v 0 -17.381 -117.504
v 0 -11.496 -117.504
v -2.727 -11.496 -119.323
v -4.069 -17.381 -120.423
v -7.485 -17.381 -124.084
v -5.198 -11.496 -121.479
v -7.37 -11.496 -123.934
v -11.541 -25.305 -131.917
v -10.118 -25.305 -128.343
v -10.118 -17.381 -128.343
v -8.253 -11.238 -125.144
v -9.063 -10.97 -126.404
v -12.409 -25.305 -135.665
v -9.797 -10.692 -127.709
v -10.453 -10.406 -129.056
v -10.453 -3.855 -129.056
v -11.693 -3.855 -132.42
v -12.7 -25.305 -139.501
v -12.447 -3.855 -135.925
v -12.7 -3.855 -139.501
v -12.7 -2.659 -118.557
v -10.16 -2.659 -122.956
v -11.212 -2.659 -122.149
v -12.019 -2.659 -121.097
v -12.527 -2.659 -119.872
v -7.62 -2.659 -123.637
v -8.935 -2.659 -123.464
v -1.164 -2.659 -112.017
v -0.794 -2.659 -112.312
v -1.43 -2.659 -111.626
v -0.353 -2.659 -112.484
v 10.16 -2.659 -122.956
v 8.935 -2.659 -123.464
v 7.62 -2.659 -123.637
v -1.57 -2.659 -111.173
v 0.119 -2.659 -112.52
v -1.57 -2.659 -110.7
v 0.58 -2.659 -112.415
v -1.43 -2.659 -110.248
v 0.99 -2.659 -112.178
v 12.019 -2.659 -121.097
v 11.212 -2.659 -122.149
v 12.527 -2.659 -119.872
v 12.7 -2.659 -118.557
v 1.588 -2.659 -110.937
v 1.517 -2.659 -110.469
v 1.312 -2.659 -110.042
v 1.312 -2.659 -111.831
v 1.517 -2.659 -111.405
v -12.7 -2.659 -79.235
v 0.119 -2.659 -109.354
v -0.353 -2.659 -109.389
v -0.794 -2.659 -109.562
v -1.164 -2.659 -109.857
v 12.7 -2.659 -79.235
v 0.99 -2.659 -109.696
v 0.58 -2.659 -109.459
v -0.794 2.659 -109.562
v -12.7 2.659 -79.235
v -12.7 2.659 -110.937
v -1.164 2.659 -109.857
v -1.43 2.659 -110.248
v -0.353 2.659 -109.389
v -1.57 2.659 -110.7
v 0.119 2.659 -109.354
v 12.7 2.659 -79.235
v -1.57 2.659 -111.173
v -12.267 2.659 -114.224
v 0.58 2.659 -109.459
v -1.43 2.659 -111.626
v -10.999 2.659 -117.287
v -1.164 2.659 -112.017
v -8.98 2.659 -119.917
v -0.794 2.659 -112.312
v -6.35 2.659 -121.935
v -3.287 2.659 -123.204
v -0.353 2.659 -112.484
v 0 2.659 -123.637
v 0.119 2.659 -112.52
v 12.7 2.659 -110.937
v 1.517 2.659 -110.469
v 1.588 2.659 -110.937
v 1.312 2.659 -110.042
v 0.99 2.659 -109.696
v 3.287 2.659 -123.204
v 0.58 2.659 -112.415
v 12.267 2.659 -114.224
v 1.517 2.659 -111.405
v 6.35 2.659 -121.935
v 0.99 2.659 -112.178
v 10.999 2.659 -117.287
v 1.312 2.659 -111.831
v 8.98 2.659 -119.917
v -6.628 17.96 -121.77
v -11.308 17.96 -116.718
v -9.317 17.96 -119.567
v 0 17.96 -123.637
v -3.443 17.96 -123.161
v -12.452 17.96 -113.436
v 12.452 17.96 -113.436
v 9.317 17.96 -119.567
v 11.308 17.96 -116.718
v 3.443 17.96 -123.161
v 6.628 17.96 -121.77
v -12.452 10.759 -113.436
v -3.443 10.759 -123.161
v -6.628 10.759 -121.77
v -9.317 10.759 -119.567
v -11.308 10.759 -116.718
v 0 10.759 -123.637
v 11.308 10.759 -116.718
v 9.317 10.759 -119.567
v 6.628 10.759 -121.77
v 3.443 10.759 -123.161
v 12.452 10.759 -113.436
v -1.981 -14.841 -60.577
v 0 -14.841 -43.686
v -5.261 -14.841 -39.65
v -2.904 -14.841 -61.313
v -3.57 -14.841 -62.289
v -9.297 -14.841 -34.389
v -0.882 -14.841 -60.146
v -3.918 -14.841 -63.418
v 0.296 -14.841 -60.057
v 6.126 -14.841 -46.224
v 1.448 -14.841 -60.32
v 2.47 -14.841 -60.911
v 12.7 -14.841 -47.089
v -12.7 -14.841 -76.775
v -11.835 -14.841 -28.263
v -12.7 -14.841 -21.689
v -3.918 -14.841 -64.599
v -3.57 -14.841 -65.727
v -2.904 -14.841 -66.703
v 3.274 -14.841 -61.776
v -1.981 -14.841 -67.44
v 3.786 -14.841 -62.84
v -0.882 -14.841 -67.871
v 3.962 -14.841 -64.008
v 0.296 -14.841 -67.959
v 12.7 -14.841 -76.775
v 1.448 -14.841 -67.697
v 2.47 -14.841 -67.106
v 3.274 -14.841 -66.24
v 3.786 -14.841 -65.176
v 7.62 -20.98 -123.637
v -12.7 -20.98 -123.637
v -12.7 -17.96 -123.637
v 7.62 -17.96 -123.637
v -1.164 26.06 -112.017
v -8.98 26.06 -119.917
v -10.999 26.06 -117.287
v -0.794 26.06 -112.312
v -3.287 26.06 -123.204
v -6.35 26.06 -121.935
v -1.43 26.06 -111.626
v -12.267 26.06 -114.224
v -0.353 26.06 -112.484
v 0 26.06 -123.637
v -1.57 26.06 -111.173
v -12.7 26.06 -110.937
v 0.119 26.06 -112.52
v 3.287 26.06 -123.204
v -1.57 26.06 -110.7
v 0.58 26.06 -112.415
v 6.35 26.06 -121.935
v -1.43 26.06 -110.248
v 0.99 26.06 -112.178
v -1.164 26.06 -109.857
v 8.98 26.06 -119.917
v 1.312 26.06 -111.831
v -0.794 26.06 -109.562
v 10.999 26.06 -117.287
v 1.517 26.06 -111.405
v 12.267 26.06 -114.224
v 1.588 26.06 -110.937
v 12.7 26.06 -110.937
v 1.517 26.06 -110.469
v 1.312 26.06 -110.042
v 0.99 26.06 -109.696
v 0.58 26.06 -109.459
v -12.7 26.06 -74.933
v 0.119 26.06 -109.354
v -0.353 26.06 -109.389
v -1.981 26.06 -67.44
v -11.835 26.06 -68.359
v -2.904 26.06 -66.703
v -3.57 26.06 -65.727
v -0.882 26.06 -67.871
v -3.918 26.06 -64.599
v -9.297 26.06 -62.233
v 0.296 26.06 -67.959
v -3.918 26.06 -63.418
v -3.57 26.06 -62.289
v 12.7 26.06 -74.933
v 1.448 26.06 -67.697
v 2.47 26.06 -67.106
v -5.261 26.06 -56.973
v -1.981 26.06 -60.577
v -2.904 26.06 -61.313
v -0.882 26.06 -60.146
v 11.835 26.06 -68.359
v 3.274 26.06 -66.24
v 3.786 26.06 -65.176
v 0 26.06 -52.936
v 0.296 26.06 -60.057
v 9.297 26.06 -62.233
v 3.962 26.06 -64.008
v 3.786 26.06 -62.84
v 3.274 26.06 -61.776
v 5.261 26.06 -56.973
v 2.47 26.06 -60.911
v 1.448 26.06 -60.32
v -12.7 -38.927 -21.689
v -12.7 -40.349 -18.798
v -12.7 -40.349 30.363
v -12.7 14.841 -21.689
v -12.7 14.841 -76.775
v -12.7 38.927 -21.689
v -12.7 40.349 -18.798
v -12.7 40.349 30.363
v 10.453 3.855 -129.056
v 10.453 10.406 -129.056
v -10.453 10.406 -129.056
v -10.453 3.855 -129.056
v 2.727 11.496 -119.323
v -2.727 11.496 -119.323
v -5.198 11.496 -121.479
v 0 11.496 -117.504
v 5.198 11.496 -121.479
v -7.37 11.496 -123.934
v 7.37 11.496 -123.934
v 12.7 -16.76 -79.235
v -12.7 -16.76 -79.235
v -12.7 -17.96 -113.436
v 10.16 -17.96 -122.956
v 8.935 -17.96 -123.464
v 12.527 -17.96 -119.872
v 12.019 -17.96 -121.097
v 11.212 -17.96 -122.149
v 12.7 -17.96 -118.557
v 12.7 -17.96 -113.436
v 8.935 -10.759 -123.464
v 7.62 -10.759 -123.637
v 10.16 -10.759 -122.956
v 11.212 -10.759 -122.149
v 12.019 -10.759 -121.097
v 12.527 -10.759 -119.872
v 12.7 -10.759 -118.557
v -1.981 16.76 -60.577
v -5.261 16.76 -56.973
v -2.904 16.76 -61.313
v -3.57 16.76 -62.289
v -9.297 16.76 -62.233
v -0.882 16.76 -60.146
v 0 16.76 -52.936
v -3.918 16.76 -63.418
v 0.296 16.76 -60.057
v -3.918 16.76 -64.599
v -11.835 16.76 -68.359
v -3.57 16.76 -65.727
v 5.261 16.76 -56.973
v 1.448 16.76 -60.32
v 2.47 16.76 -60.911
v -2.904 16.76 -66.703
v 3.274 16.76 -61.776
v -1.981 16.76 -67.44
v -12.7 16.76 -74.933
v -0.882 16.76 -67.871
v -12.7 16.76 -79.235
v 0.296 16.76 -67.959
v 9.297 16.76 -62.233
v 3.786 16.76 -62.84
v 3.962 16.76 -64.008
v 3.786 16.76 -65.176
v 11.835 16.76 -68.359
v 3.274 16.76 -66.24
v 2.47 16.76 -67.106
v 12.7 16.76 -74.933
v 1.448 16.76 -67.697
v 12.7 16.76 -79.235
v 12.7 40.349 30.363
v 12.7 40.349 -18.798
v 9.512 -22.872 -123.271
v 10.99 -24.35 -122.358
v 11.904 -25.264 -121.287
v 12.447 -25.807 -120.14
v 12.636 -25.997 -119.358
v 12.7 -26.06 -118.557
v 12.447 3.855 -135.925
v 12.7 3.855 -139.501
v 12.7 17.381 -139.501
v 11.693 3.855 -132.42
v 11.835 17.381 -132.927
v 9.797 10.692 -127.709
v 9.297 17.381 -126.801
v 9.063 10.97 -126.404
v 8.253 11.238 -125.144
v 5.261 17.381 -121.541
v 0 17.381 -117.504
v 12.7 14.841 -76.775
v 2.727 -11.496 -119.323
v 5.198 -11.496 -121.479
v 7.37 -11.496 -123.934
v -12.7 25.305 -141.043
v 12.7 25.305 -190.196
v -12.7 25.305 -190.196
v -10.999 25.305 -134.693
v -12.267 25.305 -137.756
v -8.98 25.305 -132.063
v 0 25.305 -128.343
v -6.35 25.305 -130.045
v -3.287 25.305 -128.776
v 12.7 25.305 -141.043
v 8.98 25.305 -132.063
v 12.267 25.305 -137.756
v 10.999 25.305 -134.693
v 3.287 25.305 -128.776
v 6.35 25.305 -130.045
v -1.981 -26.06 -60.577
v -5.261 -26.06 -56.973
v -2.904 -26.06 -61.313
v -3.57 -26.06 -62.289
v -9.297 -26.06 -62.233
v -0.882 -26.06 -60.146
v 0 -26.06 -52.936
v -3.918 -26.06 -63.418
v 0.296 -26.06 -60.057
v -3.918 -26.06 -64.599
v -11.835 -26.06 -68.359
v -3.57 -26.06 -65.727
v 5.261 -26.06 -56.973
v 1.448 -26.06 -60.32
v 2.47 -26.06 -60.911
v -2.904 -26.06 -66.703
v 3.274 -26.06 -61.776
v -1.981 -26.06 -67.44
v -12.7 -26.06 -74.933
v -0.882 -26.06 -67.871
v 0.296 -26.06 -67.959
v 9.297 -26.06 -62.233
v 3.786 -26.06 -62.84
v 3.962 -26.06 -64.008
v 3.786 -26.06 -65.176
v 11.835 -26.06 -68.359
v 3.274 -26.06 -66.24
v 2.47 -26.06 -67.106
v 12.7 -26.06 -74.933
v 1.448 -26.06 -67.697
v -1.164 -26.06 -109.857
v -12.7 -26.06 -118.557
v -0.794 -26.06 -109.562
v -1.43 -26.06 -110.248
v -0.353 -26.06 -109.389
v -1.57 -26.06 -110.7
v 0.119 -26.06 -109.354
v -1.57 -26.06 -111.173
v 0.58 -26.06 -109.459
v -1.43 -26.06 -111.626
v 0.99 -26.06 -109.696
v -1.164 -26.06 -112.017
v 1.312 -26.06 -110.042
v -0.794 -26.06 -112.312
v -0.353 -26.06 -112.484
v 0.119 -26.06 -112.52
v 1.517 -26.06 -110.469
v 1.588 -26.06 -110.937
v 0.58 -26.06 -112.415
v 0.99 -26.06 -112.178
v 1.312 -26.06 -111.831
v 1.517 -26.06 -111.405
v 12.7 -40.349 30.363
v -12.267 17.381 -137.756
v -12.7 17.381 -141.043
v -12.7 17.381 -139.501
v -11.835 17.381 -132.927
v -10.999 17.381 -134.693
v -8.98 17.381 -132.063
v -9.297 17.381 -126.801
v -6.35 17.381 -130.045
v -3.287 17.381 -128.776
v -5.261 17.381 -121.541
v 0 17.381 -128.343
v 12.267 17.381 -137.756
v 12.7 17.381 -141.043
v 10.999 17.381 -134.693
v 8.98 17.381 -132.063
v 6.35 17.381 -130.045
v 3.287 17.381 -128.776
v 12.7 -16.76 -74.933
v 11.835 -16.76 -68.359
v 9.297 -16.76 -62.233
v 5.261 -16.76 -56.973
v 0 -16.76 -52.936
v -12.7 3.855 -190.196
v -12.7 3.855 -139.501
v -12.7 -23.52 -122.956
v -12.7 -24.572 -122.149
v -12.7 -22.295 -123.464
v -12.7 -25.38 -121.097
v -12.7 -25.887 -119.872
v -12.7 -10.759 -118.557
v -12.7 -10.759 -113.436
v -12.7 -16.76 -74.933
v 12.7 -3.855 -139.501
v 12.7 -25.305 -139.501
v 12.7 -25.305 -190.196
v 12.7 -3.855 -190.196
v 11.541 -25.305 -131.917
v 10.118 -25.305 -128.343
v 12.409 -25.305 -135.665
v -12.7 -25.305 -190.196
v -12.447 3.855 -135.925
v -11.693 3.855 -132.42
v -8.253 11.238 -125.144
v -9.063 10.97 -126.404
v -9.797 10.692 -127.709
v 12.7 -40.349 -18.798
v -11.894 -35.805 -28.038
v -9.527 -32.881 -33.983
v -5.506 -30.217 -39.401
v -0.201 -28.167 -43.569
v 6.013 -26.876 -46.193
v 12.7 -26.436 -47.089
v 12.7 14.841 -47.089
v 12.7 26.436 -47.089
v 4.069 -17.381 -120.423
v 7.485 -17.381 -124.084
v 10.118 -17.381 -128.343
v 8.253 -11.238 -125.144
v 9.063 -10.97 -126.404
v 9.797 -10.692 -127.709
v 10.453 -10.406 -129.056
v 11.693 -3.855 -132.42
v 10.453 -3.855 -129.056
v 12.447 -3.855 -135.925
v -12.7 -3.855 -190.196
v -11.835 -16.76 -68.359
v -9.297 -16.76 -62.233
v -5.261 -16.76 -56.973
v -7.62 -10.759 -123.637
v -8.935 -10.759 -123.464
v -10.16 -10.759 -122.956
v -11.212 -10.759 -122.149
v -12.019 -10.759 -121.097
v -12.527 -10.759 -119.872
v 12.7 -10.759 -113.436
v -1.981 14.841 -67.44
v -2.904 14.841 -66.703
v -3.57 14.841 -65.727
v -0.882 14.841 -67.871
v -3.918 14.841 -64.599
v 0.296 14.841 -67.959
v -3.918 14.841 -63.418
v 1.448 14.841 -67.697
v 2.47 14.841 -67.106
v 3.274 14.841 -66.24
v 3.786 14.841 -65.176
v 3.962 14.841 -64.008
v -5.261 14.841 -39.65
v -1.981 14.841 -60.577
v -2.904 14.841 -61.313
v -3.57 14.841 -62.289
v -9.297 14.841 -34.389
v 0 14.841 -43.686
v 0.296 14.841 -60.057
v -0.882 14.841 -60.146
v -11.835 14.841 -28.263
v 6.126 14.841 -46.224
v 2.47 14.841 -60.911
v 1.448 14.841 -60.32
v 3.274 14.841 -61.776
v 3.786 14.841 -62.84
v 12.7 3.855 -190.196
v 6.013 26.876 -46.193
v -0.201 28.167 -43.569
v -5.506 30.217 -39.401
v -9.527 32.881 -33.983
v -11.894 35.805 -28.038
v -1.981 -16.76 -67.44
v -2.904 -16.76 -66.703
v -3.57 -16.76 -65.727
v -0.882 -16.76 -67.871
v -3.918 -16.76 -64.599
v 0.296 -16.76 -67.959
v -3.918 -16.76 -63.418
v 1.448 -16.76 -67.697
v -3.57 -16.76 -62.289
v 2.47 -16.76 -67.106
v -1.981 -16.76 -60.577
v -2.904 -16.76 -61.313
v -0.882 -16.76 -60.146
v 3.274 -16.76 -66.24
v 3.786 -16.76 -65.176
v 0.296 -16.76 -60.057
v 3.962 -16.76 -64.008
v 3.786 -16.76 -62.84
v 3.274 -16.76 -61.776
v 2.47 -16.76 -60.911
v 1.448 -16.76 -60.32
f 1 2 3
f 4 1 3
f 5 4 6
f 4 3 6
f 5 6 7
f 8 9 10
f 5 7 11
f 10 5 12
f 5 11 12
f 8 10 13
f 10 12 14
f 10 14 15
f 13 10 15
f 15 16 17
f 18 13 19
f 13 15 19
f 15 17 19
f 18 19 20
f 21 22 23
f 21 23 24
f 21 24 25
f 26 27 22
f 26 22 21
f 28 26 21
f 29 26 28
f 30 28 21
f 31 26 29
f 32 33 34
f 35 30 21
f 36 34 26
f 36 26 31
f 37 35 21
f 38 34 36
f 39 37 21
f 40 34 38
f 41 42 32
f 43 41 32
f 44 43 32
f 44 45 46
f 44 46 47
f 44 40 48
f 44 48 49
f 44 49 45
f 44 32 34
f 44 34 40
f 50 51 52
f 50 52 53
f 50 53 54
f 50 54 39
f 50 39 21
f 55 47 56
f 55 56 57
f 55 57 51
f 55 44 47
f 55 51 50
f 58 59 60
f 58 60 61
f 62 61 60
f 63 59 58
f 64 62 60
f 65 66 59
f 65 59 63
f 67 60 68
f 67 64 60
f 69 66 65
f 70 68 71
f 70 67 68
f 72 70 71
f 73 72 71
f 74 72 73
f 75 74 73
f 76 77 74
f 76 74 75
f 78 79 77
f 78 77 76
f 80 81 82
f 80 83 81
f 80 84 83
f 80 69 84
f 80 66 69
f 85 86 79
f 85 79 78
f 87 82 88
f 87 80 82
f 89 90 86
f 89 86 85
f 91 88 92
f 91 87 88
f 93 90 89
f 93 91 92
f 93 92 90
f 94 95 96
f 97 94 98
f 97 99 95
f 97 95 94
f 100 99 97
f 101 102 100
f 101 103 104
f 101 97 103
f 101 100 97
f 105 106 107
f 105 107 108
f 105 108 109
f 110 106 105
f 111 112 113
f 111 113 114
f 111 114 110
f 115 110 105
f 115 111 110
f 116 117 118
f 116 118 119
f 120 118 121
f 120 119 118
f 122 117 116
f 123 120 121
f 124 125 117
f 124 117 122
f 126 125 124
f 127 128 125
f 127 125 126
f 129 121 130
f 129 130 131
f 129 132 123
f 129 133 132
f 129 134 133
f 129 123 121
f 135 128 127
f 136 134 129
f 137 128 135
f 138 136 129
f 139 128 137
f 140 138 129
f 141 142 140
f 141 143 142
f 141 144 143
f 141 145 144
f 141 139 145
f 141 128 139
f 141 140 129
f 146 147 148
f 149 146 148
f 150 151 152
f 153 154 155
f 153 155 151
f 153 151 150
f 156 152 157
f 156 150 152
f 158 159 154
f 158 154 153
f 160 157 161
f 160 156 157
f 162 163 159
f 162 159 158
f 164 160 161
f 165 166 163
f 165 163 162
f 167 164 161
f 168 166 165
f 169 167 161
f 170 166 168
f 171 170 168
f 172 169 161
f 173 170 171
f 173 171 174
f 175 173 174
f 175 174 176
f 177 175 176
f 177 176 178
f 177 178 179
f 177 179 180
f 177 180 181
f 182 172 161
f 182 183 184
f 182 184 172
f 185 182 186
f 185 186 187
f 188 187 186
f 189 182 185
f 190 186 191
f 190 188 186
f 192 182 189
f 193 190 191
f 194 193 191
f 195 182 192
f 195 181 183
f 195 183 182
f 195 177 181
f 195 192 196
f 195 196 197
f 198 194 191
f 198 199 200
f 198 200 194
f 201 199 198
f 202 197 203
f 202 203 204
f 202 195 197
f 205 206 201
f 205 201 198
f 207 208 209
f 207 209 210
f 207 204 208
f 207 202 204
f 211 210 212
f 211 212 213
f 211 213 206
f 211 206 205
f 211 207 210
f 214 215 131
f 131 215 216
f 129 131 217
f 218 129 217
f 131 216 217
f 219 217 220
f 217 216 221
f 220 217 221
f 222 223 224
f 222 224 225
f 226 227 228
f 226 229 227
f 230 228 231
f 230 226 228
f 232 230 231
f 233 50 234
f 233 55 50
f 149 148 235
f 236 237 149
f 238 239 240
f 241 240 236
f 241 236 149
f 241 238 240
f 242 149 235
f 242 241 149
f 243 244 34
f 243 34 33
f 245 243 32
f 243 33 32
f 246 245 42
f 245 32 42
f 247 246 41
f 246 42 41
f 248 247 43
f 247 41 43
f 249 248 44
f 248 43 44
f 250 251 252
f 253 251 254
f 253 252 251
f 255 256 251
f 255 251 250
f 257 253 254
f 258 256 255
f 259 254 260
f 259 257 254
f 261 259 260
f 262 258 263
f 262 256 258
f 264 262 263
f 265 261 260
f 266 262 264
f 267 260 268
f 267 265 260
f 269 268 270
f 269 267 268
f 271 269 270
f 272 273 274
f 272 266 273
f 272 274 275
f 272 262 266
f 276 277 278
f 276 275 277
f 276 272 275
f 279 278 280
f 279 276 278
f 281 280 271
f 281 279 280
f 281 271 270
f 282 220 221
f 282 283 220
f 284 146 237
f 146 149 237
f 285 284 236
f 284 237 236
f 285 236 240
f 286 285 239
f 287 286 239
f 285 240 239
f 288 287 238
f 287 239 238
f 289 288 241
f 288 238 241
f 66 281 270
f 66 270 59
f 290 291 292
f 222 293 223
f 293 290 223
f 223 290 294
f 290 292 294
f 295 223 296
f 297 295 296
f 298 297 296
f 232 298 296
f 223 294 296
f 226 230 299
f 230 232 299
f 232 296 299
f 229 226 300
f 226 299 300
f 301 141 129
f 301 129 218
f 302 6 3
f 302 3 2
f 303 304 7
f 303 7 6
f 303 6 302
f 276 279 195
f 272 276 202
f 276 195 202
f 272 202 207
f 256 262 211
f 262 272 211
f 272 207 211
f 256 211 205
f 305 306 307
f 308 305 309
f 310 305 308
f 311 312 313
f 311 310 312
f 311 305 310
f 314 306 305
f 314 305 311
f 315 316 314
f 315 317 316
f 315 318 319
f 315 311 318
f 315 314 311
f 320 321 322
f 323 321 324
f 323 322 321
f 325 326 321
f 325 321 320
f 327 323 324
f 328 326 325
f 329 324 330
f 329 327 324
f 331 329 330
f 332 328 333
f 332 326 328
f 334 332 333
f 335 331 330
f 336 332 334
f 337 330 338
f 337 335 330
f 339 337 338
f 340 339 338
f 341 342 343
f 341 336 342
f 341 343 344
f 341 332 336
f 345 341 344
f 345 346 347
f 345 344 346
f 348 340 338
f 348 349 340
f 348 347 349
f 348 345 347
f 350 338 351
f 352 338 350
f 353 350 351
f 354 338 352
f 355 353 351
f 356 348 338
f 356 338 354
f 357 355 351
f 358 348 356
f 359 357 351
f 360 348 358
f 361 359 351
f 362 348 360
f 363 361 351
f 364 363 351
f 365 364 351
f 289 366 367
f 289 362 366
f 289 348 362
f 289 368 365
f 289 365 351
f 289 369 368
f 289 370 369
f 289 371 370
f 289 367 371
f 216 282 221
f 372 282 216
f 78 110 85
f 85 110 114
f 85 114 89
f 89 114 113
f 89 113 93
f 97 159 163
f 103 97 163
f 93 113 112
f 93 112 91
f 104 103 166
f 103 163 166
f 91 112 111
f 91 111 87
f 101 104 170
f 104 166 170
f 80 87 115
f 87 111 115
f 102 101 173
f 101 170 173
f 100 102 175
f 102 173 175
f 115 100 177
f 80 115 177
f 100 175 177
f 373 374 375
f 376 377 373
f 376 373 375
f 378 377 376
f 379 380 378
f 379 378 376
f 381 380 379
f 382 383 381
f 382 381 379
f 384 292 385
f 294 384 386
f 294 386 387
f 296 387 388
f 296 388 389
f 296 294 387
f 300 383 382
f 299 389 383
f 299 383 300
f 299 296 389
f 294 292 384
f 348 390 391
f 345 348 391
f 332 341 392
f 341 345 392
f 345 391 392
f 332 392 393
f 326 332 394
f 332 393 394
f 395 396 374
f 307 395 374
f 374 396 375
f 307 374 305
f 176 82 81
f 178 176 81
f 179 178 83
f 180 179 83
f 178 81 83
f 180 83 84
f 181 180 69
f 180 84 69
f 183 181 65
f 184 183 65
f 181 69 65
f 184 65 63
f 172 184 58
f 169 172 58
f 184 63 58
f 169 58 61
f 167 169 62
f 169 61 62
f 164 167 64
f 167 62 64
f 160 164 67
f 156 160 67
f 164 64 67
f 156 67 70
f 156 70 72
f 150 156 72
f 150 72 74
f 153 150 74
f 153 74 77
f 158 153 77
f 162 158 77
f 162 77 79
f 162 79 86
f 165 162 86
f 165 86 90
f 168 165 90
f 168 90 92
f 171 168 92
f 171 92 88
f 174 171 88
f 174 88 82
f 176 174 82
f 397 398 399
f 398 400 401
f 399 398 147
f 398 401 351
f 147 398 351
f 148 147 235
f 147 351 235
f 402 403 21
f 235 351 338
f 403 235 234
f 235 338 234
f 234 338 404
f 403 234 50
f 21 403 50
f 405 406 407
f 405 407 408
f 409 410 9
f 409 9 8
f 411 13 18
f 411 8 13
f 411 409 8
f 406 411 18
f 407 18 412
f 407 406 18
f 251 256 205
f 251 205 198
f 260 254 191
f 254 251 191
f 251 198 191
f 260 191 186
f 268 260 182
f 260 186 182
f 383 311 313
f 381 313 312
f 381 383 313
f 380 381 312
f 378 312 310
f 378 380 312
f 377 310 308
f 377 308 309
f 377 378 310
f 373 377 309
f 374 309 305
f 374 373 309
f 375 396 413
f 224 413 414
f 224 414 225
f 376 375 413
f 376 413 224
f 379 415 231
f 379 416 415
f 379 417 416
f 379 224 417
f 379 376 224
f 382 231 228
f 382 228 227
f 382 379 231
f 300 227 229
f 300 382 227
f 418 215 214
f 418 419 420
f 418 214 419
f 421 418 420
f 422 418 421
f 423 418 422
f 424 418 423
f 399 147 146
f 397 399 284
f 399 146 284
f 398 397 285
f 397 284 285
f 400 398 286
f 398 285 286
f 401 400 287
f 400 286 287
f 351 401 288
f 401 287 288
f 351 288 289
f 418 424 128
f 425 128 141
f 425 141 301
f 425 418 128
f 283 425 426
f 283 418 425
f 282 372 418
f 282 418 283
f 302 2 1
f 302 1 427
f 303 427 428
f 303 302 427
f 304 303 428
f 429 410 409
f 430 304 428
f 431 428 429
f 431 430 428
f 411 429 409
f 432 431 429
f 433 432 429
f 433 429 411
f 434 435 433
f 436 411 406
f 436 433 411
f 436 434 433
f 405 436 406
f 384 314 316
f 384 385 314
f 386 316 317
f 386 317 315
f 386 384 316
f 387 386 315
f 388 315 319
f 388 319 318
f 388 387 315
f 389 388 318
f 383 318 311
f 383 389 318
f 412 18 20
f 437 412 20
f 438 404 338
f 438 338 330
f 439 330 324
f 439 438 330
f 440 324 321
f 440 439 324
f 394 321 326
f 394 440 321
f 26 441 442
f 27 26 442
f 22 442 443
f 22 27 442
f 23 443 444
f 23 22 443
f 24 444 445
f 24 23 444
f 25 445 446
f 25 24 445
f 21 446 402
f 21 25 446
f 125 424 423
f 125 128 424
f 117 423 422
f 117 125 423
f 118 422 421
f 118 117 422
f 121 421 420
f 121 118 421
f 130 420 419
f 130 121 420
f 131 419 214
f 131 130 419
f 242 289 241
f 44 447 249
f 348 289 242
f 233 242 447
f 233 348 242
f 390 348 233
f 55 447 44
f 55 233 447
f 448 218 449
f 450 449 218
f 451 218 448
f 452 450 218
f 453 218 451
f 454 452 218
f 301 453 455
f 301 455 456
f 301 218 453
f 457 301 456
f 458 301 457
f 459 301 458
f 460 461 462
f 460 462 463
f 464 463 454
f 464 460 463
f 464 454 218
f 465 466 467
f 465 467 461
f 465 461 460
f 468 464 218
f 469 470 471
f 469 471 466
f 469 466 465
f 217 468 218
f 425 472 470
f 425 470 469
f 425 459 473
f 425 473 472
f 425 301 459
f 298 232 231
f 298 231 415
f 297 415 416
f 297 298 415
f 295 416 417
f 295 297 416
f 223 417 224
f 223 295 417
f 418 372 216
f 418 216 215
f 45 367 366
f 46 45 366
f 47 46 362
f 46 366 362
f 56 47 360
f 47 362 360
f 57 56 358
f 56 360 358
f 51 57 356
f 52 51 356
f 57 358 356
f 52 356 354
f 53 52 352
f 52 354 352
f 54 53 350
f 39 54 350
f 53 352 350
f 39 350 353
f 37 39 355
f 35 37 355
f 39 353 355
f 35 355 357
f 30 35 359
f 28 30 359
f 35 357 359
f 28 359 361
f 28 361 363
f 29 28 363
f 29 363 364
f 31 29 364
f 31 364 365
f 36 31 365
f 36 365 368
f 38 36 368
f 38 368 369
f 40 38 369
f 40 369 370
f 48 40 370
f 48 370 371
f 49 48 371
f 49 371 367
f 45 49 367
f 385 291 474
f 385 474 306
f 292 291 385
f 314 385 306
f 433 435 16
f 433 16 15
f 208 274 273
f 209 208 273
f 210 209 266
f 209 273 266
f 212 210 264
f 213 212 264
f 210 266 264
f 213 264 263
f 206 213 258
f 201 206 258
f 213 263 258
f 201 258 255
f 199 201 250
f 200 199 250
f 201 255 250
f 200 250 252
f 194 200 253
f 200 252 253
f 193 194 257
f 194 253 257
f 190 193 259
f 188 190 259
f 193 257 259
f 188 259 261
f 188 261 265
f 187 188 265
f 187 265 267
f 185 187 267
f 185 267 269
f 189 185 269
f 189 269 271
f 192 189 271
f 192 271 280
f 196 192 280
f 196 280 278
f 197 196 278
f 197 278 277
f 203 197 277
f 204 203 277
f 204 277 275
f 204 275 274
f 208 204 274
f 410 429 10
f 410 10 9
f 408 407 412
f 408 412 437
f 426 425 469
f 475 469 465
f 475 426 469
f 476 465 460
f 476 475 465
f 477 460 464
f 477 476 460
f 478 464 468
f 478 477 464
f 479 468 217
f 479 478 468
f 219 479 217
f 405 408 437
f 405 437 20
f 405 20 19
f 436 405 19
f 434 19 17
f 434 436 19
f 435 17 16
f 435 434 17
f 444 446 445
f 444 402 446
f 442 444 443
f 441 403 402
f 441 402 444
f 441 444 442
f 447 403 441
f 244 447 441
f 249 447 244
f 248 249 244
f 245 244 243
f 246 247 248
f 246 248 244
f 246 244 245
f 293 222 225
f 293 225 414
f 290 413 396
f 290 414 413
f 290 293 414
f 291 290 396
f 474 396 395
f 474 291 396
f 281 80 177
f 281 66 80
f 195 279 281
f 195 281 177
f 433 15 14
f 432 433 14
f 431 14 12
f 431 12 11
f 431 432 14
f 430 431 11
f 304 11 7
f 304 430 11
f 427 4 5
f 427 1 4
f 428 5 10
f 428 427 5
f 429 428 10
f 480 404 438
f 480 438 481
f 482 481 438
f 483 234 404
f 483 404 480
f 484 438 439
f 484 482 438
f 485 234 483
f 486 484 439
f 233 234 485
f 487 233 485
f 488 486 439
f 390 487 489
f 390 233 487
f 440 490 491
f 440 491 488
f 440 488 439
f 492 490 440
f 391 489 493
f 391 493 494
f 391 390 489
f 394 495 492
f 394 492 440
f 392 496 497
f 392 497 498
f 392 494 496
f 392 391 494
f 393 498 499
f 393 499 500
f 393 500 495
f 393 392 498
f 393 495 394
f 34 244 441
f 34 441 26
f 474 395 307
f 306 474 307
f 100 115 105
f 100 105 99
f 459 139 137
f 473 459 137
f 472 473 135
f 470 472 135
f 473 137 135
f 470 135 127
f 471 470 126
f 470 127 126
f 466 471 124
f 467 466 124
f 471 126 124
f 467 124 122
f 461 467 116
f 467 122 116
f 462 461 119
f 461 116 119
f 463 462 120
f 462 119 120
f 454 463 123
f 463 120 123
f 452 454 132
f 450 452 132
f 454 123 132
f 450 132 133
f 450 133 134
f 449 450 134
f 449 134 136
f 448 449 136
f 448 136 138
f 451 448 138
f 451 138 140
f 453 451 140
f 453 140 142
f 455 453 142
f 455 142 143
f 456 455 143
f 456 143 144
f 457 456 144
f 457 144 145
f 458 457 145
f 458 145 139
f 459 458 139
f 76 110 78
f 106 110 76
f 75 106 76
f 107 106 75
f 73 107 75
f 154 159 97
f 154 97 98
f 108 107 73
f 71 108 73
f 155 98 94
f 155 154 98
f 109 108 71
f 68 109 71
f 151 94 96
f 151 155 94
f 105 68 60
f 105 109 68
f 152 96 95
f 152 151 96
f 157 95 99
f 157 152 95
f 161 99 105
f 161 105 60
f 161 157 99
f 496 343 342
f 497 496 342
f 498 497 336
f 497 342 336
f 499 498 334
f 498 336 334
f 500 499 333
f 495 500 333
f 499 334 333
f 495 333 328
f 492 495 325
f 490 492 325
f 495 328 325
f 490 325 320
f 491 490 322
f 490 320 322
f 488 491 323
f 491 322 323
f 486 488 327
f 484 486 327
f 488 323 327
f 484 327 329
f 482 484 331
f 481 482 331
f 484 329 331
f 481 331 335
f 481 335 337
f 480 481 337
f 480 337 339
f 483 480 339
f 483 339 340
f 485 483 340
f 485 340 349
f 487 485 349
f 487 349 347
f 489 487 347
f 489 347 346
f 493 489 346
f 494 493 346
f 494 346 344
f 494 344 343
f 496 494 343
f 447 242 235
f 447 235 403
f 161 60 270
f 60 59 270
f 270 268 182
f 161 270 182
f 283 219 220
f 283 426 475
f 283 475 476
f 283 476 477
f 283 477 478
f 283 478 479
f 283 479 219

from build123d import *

# Parameters (mm, degrees)
F6_DEPTH       = 12.7
F7_DEPTH       = 12.7
F8_DEPTH       = 12.7
F9_F1_R        = 12.7
F9_F2_R        = 12.6999
F9_2_T1_DEPTH  = 71.6003941596
F9_2_T3_DEPTH  = 71.6003969535
F10_R          = 5.08
F11_T1_DEPTH   = 132.8857165277
F11_2_T1_DEPTH = 132.8857165277
F12_T1_DEPTH   = 136.3004535884
F12_2_T1_DEPTH = 136.3004535884
F12_3_F1_R     = 25.3999
F12_3_F2_R     = 25.3999
F13_R          = 3.1967586716
F14_DEPTH      = 40.3502301702
F15_R          = 3.9621319953
F16_DEPTH      = 66.4104053209
F19_R          = 1.5875
F20_DEPTH      = 66.4104053209


# Not quite as in the source:
# - a fillet or chamfer that OpenCascade refuses, or shapes differently, is made with other operations: its cross-section is extruded or revolved along the edge and cut away or added
# - a fillet or chamfer is up to 0.001 mm smaller than in the source, because OpenCascade refuses the exact size
# - a feature of the source that left no trace in its solid (it failed there, or was rolled back) is left out
# - the program builds the solid bodies; features that only make, move or delete a surface that nothing else refers to are left out


with BuildPart() as f6:
    # F5 (on Right) → F6 (new body, symmetric)
    with BuildSketch(Plane.YZ):
        Polygon((17.381310463, -124.0725144744), (17.381310463, -114.1014173627), (11.4955939353, -114.1014173627), (11.4955939353, -123.9340305328), (10.4060629383, -129.0555149317), (3.8553033955, -129.0555149317), (3.8553033955, -190.1959329844), (8.2224793732, -190.1959329844), (20.4505622387, -190.1959329844), (25.3053139895, -190.1959329844), (25.3053139895, -128.343090415), (17.381310463, -128.343090415), align=None)
    extrude(amount=F6_DEPTH, both=True)

    # F9: fillet of radius 12.7 on 2 edges, made by hand

    # F9_f1
    f9_f1_edges = [f6.edges().sort_by_distance(p)[0] for p in [
        (-12.7, 21.3433122262, -128.343090415),
    ]]
    fillet(f9_f1_edges, radius=F9_F1_R)

    # F9_f2 (radius 12.7 in the source; OpenCascade refuses exactly that, so slightly less here)
    f9_f2_edges = [f6.edges().sort_by_distance(p)[0] for p in [
        (12.7, 21.3433122262, -128.343090415),
    ]]
    fillet(f9_f2_edges, radius=F9_F2_R)

    # F11: fillet of radius 25.4 on 2 edges, made by hand

    # F11_s2 → F11_t1 (cut)
    with BuildSketch(Plane.XZ.offset(-80.881310463)):
        with BuildLine():
            ThreePointArc((12.7, -139.5014173627), (5.2605122421, -121.5409051206), (-12.7, -114.1014173627))
            Line((-12.7, -114.1014173627), (12.7, -114.1014173627))
            Line((12.7, -114.1014173627), (12.7, -139.5014173627))
        make_face()
        with BuildLine():
            ThreePointArc((-12.7, -139.5014173627), (-5.2605122421, -121.5409051206), (12.7, -114.1014173627))
            Line((12.7, -114.1014173627), (-12.7, -114.1014173627))
            Line((-12.7, -114.1014173627), (-12.7, -139.5014173627))
        make_face()
    extrude(amount=F11_T1_DEPTH, mode=Mode.SUBTRACT)


with BuildPart() as f6b:
    # F5 (on Right) → F6, piece 2 (new body, symmetric)
    with BuildSketch(Plane.YZ):
        Polygon((-17.381310463, -128.343090415), (-25.3053139895, -128.343090415), (-25.3053139895, -190.1959329844), (-20.4505622387, -190.1959329844), (-8.2224793732, -190.1959329844), (-3.8553033955, -190.1959329844), (-3.8553033955, -129.0555149317), (-10.4060629383, -129.0555149317), (-11.4955939353, -123.9340305328), (-11.4955939353, -114.1014173627), (-17.381310463, -114.1014173627), (-17.381310463, -124.0725144744), align=None)
    extrude(amount=F6_DEPTH, both=True)

    # F11#2: fillet of radius 25.4 on 2 edges, made by hand

    # F11_2_s2 → F11_2_t1 (cut)
    with BuildSketch(Plane.XZ.offset(-52.0044060647)):
        with BuildLine():
            ThreePointArc((-12.7, -114.1014173627), (5.2605122421, -121.5409051206), (12.7, -139.5014173627))
            Line((12.7, -139.5014173627), (12.7, -114.1014173627))
            Line((12.7, -114.1014173627), (-12.7, -114.1014173627))
        make_face()
        with BuildLine():
            ThreePointArc((12.7, -114.1014173627), (-5.2605122421, -121.5409051206), (-12.7, -139.5014173627))
            Line((-12.7, -139.5014173627), (-12.7, -114.1014173627))
            Line((-12.7, -114.1014173627), (12.7, -114.1014173627))
        make_face()
    extrude(amount=F11_2_T1_DEPTH, mode=Mode.SUBTRACT)


with BuildPart() as f7:
    # F4 (on Right) → F7 (new body, symmetric)
    with BuildSketch(Plane.YZ):
        Polygon((26.0601751506, -123.6367598176), (26.0601751506, -49.5331436396), (16.7597215623, -49.5331436396), (16.7597215623, -79.2345926166), (2.65903119, -79.2345926166), (2.65903119, -123.6367598176), (10.7594281435, -123.6367598176), (10.7594281435, -113.4362667799), (17.9597809911, -113.4362667799), (17.9597809911, -123.6367598176), align=None)
    extrude(amount=F7_DEPTH, both=True)

    # F9#2: fillet of radius 12.7 on 4 edges, made by hand

    # F9_2_s2 → F9_2_t1 (cut)
    with BuildSketch(Plane.XZ.offset(-57.8101751506)):
        with BuildLine():
            ThreePointArc((0, -123.6367598176), (8.9802561211, -119.9170159387), (12.7, -110.9367598176))
            Line((12.7, -110.9367598176), (12.7, -123.6367598176))
            Line((12.7, -123.6367598176), (0, -123.6367598176))
        make_face()
        with BuildLine():
            ThreePointArc((0, -123.6367598176), (-8.9802561211, -119.9170159387), (-12.7, -110.9367598176))
            Line((-12.7, -110.9367598176), (-12.7, -123.6367598176))
            Line((-12.7, -123.6367598176), (0, -123.6367598176))
        make_face()
    extrude(amount=F9_2_T1_DEPTH, mode=Mode.SUBTRACT)

    # F9_2_s4 → F9_2_t3 (cut)
    with BuildSketch(Plane.XZ.offset(-42.5094281435)):
        with BuildLine():
            ThreePointArc((0, -123.6367598176), (-8.9802561211, -119.9170159387), (-12.7, -110.9367598176))
            Line((-12.7, -110.9367598176), (-12.7, -123.6367598176))
            Line((-12.7, -123.6367598176), (0, -123.6367598176))
        make_face()
        with BuildLine():
            ThreePointArc((0, -123.6367598176), (8.9802561211, -119.9170159387), (12.7, -110.9367598176))
            Line((12.7, -110.9367598176), (12.7, -123.6367598176))
            Line((12.7, -123.6367598176), (0, -123.6367598176))
        make_face()
    extrude(amount=F9_2_T3_DEPTH, mode=Mode.SUBTRACT)

    # F12: fillet of radius 25.4 on 2 edges, made by hand

    # F12_s2 → F12_t1 (cut)
    with BuildSketch(Plane.XZ.offset(-89.5601751506)):
        with BuildLine():
            ThreePointArc((12.7, -49.5331436396), (-5.2605122421, -56.9726313974), (-12.7, -74.9331436396))
            Line((-12.7, -74.9331436396), (-12.7, -49.5331436396))
            Line((-12.7, -49.5331436396), (12.7, -49.5331436396))
        make_face()
        with BuildLine():
            ThreePointArc((12.7, -74.9331436396), (5.2605122421, -56.9726313974), (-12.7, -49.5331436396))
            Line((-12.7, -49.5331436396), (12.7, -49.5331436396))
            Line((12.7, -49.5331436396), (12.7, -74.9331436396))
        make_face()
    extrude(amount=F12_T1_DEPTH, mode=Mode.SUBTRACT)


with BuildPart() as f7b:
    # F4 (on Right) → F7, piece 2 (new body, symmetric)
    with BuildSketch(Plane.YZ):
        Polygon((-16.7597215623, -49.5331436396), (-26.0601751506, -49.5331436396), (-26.0601751506, -123.6367598176), (-17.9597809911, -123.6367598176), (-17.9597809911, -113.4362667799), (-10.7594281435, -113.4362667799), (-10.7594281435, -123.6367598176), (-2.65903119, -123.6367598176), (-2.65903119, -79.2345926166), (-16.7597215623, -79.2345926166), align=None)
    extrude(amount=F7_DEPTH, both=True)

    # F10
    f10_edges = [f7b.edges().sort_by_distance(p)[0] for p in [
        (12.7, -22.009978, -123.63676),
        (0, -26.060175, -123.63676),
        (-12.7, -6.70923, -123.63676),
        (12.7, -6.70923, -123.63676),
    ]]
    fillet(f10_edges, radius=F10_R)

    # F12#2: fillet of radius 25.4 on 2 edges, made by hand

    # F12_2_s2 → F12_2_t1 (cut)
    with BuildSketch(Plane.XZ.offset(-46.7402784377)):
        with BuildLine():
            ThreePointArc((-12.7, -74.9331436396), (-5.2605122421, -56.9726313974), (12.7, -49.5331436396))
            Line((12.7, -49.5331436396), (-12.7, -49.5331436396))
            Line((-12.7, -49.5331436396), (-12.7, -74.9331436396))
        make_face()
        with BuildLine():
            ThreePointArc((12.7, -74.9331436396), (5.2605122421, -56.9726313974), (-12.7, -49.5331436396))
            Line((-12.7, -49.5331436396), (12.7, -49.5331436396))
            Line((12.7, -49.5331436396), (12.7, -74.9331436396))
        make_face()
    extrude(amount=F12_2_T1_DEPTH, mode=Mode.SUBTRACT)


with BuildPart() as f8:
    # F3 (on Right) → F8 (new body, symmetric)
    with BuildSketch(Plane.YZ):
        Polygon((40.3492301702, 30.3626544774), (-40.3492301702, 30.3626544774), (-40.3492301702, 0), (-40.3492301702, -18.7984760851), (-26.4357030392, -47.0893159509), (-14.841097407, -47.0893159509), (-14.841097407, -76.7751282773), (14.841097407, -76.7751282773), (14.841097407, -47.0893159509), (26.4357030392, -47.0893159509), (40.3492301702, -18.7984760851), (40.3492301702, 0), align=None)
    extrude(amount=F8_DEPTH, both=True)

    # F12#3: fillet of radius 25.4 on 2 edges, made by hand

    # F12_3_f1 (radius 25.4 in the source; OpenCascade refuses exactly that, so slightly less here)
    f12_3_f1_edges = [f8.edges().sort_by_distance(p)[0] for p in [
        (-12.7, 20.6384002231, -47.0893159509),
    ]]
    fillet(f12_3_f1_edges, radius=F12_3_F1_R)

    # F12_3_f2 (radius 25.4 in the source; OpenCascade refuses exactly that, so slightly less here)
    f12_3_f2_edges = [f8.edges().sort_by_distance(p)[0] for p in [
        (-12.7, -20.6384002231, -47.0893159509),
    ]]
    fillet(f12_3_f2_edges, radius=F12_3_F2_R)


with BuildPart() as f14_tool:
    # F13 (on Front) → F14 (new body, through all)
    with BuildSketch(Plane.XZ):
        with Locations((0, -63.4542033076)):
            Circle(F13_R)
    extrude(amount=-F14_DEPTH)


with BuildPart() as f7_1:
    add(f7.part)

    # F14: cut by f14_tool
    add(f14_tool.part, mode=Mode.SUBTRACT)


with BuildPart() as f8_1:
    add(f8.part)

    # F14: cut by f14_tool
    add(f14_tool.part, mode=Mode.SUBTRACT)


with BuildPart() as f16_tool:
    # F15 (on face) → F16 (new body, through all)
    with BuildSketch(Plane.XZ.offset(26.0601751506)):
        with Locations((0, -64.0083104372)):
            Circle(F15_R)
    extrude(amount=-F16_DEPTH)


with BuildPart() as f7_2:
    add(f7_1.part)

    # F16: cut by f16_tool
    add(f16_tool.part, mode=Mode.SUBTRACT)


with BuildPart() as f7b_1:
    add(f7b.part)

    # F16: cut by f16_tool
    add(f16_tool.part, mode=Mode.SUBTRACT)


with BuildPart() as f8_2:
    add(f8_1.part)

    # F16: cut by f16_tool
    add(f16_tool.part, mode=Mode.SUBTRACT)


with BuildPart() as f20_tool:
    # F19 (on face) → F20 (new body, through all)
    with BuildSketch(Plane.XZ.offset(26.0601751506)):
        with Locations((0, -110.9367598176)):
            Circle(F19_R)
    extrude(amount=-F20_DEPTH)


with BuildPart() as f7_3:
    add(f7_2.part)

    # F20: cut by f20_tool
    add(f20_tool.part, mode=Mode.SUBTRACT)


with BuildPart() as f7b_2:
    add(f7b_1.part)

    # F20: cut by f20_tool
    add(f20_tool.part, mode=Mode.SUBTRACT)


solid = Compound([f6.part, f6b.part, f8_2.part, f7_3.part, f7b_2.part])
